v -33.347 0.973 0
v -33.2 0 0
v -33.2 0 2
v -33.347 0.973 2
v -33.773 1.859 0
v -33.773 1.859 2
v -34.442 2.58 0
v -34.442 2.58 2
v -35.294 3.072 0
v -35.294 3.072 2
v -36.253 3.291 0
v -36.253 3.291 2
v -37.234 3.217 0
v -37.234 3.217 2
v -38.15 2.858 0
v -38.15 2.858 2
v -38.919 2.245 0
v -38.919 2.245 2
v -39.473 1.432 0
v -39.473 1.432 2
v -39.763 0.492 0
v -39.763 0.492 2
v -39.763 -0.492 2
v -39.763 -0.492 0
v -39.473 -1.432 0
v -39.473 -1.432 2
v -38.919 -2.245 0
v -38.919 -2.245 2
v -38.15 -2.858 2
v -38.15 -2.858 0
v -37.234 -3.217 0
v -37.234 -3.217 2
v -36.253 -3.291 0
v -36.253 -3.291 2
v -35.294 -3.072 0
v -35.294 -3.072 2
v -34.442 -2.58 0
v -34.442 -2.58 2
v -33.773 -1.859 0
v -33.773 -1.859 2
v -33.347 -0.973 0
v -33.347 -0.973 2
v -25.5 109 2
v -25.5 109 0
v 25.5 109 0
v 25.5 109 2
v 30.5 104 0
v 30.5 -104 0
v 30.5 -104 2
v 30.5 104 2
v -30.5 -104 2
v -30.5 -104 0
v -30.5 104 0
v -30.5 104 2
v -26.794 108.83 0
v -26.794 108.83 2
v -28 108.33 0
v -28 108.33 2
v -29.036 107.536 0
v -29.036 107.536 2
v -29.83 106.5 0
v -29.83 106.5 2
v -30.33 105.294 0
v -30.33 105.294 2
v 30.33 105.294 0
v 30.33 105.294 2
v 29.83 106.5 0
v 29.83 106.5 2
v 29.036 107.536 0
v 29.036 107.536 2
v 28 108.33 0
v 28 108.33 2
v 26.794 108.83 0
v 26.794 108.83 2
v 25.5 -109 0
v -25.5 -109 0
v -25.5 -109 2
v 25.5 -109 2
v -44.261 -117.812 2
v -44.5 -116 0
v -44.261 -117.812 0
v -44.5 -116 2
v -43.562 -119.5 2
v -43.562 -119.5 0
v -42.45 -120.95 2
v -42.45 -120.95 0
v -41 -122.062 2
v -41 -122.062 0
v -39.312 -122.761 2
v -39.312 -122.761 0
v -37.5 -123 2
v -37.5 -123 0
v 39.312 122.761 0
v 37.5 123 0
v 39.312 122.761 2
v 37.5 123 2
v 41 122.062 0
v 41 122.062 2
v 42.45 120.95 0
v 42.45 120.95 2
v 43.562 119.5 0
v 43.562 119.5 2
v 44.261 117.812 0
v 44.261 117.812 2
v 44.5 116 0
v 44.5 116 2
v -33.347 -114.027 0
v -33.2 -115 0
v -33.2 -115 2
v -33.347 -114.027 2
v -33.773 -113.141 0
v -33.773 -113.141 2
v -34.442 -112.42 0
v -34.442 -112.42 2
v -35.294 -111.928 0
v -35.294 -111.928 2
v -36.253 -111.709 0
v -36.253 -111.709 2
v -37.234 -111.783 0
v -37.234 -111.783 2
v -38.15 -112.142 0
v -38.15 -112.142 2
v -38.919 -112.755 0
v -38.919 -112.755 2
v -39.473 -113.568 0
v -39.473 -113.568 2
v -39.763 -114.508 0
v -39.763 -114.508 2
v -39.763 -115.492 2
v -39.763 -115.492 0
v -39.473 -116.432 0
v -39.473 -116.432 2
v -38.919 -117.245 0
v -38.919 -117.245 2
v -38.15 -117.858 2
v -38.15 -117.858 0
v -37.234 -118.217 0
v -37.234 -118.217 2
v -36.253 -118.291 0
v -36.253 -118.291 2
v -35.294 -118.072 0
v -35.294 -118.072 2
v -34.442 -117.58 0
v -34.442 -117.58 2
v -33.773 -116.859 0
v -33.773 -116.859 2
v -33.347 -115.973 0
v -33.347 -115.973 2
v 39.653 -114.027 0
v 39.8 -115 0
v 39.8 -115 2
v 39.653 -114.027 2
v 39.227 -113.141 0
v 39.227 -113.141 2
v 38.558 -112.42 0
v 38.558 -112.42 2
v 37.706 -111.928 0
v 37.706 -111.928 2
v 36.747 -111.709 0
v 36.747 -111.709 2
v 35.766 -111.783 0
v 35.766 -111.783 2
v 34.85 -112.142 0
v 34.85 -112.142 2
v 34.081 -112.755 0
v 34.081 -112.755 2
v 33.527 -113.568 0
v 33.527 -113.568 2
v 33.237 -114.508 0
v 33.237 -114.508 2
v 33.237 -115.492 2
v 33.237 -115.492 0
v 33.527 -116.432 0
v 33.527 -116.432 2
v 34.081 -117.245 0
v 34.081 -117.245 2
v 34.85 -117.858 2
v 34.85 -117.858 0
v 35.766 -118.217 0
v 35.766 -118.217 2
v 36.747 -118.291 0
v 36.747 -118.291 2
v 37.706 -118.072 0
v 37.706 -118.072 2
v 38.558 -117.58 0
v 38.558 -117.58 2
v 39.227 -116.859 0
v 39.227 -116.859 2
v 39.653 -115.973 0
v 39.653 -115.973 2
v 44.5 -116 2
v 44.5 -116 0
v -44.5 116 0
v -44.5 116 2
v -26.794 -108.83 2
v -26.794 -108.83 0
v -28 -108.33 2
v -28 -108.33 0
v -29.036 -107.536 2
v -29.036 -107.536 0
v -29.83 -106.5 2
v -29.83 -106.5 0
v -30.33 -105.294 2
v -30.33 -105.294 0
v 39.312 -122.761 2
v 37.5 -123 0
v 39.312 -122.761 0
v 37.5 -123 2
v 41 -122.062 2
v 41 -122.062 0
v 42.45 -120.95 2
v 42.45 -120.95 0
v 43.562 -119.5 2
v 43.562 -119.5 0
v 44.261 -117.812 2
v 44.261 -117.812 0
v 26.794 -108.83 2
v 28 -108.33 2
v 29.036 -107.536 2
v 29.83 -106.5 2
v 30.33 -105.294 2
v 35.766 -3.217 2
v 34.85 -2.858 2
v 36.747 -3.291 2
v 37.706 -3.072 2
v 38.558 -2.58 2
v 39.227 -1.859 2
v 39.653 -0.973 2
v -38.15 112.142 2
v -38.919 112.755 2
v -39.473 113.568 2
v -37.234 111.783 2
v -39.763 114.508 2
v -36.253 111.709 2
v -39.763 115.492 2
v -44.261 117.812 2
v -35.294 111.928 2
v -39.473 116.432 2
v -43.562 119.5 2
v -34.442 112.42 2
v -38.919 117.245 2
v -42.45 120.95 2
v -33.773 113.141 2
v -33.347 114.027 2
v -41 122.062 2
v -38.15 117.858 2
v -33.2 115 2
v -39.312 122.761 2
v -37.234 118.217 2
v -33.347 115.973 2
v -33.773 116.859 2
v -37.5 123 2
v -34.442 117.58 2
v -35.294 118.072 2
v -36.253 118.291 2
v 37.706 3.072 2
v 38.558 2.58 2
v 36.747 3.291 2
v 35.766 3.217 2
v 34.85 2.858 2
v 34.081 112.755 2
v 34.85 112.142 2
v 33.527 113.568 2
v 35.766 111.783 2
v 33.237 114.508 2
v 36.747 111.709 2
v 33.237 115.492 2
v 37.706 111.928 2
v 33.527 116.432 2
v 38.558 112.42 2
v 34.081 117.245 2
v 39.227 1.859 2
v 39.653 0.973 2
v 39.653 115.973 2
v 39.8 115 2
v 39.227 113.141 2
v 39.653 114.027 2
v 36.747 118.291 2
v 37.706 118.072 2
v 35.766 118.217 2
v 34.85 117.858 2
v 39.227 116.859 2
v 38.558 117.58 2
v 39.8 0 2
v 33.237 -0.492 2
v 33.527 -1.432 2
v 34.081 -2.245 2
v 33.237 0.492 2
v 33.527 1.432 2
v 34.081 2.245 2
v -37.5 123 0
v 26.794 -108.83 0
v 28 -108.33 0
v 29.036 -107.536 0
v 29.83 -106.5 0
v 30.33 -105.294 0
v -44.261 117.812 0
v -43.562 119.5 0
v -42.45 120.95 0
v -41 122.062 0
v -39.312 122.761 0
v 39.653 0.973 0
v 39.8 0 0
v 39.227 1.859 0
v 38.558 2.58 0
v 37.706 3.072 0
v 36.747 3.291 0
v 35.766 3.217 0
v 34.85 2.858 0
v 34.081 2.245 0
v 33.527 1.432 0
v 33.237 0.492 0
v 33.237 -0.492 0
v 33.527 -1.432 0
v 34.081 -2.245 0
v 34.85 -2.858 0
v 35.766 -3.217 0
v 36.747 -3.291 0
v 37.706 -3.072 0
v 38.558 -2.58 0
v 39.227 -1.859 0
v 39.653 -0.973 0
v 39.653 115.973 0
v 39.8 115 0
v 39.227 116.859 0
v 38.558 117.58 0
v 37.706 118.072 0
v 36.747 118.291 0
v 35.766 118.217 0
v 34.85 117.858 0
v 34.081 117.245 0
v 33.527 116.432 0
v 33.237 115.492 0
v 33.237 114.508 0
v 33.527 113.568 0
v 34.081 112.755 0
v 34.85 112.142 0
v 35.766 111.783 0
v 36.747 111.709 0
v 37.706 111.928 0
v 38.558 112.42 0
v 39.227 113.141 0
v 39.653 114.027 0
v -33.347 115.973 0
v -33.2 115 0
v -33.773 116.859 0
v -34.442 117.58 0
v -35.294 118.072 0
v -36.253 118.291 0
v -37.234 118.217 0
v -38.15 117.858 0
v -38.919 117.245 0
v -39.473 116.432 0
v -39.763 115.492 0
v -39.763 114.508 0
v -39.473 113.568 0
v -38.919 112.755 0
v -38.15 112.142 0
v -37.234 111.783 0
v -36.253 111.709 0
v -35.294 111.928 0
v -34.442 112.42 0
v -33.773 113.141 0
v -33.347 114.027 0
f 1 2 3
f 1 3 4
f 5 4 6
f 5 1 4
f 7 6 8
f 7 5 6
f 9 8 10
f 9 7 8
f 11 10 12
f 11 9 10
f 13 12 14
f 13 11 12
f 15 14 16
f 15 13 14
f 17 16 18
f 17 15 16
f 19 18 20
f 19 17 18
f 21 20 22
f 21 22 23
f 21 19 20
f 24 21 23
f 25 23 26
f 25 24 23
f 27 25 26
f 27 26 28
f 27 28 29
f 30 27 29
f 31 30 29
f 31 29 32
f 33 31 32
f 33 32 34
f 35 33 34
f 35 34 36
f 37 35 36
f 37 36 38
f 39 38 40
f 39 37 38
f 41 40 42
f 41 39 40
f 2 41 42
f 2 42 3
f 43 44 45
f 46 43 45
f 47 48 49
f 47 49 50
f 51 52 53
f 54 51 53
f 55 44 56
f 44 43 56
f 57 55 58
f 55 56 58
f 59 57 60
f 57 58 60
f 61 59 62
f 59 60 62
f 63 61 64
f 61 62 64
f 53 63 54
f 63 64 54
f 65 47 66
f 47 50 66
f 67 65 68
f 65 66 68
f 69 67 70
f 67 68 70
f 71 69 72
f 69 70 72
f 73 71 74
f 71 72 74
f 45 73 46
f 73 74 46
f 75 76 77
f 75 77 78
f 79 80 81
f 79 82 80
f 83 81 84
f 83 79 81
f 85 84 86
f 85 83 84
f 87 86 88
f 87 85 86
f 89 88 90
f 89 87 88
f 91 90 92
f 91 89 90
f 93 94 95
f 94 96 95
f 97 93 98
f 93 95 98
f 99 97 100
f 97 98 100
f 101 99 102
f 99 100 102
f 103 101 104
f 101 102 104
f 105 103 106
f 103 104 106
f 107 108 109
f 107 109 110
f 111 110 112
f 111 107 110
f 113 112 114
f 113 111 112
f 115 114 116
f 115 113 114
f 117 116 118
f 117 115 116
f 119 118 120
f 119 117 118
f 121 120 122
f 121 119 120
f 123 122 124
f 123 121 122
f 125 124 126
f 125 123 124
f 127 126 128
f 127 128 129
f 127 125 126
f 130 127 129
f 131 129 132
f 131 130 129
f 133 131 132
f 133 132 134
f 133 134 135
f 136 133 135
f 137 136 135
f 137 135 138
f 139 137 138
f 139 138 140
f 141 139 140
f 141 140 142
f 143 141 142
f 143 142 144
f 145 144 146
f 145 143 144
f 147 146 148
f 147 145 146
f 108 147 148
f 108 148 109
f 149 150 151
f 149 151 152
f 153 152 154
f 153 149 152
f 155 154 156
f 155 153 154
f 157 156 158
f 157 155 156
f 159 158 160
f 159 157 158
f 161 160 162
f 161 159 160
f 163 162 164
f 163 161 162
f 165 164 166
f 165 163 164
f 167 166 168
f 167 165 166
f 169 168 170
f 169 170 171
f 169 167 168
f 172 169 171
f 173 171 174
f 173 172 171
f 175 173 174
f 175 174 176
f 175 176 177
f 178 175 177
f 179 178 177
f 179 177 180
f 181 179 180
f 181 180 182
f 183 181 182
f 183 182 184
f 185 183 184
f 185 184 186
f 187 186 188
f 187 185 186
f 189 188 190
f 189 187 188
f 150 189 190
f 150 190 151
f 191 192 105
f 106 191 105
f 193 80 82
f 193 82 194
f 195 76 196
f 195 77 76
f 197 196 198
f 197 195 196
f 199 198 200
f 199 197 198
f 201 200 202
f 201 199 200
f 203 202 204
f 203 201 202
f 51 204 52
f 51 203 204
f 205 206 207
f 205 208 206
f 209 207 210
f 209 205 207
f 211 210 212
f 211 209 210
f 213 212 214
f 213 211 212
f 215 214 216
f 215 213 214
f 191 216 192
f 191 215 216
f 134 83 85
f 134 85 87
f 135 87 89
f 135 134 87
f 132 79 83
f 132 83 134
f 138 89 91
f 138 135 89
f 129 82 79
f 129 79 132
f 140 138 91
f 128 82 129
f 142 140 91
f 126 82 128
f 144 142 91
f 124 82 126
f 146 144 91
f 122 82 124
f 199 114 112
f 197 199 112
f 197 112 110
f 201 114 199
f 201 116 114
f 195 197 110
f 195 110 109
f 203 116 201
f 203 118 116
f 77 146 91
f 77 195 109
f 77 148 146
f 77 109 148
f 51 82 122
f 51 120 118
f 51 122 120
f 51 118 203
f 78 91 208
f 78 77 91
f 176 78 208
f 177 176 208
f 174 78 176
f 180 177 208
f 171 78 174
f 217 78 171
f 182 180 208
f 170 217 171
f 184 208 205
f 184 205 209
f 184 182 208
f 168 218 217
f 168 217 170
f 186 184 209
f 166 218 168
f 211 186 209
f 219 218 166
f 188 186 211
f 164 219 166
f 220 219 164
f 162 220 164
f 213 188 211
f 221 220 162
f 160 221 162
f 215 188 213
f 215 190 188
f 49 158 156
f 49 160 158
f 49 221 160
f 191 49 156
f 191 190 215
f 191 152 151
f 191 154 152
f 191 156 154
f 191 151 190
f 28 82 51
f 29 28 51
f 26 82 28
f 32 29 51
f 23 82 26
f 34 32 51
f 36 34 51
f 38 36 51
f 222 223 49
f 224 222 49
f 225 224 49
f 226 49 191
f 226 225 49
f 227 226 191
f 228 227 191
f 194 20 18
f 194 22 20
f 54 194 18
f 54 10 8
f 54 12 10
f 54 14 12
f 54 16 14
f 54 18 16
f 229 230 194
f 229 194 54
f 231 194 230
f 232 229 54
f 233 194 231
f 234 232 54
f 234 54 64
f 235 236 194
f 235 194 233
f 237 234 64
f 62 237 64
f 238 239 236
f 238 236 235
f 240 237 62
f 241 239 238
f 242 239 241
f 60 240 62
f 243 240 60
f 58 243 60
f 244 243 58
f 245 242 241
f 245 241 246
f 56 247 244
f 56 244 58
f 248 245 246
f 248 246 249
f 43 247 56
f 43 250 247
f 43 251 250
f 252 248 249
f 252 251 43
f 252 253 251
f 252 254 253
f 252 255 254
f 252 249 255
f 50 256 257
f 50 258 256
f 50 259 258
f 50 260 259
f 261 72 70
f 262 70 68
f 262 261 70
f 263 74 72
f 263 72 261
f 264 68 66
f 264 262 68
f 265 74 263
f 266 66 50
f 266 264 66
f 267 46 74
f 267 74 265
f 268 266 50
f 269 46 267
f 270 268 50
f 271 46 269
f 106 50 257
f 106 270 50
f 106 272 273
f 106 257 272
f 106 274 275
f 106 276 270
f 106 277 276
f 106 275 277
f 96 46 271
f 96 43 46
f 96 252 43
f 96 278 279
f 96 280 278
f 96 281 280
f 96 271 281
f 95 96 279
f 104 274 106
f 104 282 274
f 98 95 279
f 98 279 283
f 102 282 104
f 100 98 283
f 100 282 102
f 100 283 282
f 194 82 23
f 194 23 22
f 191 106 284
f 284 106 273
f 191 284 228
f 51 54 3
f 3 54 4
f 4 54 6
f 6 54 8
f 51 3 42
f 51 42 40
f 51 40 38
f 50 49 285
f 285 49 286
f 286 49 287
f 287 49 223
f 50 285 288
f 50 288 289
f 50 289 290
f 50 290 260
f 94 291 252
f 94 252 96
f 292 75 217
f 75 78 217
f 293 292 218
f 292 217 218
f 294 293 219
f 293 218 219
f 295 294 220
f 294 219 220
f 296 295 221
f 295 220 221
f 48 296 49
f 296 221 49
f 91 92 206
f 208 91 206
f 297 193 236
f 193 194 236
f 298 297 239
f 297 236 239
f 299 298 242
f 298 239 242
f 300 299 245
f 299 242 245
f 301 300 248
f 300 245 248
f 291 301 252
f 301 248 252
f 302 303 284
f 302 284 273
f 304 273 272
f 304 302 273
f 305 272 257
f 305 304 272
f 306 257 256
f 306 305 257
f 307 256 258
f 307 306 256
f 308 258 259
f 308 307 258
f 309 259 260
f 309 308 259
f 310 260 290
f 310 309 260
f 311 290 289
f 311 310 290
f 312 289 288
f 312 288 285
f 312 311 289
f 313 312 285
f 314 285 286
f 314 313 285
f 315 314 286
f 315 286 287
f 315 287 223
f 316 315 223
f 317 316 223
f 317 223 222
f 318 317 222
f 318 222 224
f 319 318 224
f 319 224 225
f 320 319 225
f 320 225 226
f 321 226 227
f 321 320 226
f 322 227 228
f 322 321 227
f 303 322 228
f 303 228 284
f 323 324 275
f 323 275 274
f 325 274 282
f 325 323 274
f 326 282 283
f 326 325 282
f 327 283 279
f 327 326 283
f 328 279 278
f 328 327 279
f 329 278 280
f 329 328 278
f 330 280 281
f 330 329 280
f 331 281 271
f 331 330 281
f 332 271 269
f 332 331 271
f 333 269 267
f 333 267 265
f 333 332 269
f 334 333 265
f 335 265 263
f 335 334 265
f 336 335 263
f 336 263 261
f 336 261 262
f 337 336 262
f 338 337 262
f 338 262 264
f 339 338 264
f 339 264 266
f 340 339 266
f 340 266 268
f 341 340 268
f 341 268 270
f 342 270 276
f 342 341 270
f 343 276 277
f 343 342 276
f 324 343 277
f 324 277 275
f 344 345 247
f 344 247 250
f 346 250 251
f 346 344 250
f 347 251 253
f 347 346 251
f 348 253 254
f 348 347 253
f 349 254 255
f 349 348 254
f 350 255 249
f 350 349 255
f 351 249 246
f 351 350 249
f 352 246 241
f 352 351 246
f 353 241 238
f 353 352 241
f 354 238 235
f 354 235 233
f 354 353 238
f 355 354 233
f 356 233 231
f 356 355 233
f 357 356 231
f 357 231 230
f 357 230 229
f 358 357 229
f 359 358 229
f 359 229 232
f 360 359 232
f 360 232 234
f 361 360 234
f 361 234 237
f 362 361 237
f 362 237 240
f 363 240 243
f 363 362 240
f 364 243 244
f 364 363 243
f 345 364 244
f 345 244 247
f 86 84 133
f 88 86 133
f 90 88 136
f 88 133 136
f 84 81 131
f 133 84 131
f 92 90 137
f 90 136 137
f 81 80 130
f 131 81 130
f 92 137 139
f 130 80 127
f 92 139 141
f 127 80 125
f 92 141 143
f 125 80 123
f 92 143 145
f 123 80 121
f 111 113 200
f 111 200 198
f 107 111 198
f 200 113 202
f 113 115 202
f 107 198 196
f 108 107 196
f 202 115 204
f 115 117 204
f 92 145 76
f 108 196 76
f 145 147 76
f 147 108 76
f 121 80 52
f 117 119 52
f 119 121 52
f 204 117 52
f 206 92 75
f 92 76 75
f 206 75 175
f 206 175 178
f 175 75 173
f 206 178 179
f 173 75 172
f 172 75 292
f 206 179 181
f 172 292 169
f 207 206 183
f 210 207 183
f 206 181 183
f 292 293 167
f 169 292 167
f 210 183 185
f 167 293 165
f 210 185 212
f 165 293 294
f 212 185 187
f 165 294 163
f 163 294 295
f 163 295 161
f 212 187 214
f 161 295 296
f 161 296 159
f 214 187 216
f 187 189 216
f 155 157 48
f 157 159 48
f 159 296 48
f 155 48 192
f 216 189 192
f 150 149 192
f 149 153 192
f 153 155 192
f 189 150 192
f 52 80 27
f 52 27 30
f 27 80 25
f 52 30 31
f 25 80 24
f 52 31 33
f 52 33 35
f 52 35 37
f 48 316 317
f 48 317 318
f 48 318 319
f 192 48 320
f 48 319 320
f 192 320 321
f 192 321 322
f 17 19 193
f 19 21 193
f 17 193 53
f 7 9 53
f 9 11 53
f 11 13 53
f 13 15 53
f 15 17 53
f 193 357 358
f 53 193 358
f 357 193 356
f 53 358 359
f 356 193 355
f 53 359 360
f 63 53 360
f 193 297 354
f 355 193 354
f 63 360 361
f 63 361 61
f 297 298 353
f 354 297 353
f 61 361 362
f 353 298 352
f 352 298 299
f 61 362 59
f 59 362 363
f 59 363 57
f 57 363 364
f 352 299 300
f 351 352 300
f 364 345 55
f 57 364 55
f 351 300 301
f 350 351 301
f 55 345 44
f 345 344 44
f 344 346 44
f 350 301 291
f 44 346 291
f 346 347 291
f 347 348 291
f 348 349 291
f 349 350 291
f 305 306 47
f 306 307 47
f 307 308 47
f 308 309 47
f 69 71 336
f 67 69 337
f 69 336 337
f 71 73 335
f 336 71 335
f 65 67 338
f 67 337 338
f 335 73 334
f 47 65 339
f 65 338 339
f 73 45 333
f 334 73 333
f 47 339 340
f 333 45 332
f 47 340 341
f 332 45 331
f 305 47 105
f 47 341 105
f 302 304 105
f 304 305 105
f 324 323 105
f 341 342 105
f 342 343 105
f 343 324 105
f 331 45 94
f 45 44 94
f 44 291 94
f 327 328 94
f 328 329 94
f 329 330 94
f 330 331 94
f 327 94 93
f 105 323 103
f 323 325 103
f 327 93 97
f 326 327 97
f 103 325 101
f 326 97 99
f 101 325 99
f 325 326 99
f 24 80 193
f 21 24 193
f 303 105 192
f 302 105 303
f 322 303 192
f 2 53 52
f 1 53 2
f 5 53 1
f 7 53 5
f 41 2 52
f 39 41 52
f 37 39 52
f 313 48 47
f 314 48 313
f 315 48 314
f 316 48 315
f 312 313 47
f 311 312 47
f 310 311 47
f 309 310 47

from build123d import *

# Parameters (mm, degrees)
SKETCH_1_W              = 89
SKETCH_1_H              = 246
SKETCH_1_W_2            = 61
SKETCH_1_H_2            = 218
EXTRUDE_1_DEPTH         = 2
FILLET_1_R              = 5
FILLET_2_R              = 7
HOLE_WIZARD_1_OUTLINE_R = 3.3
HOLE_WIZARD_1_DEPTH     = 2


# Read off the part's stored shape, not the designer's step: 孔1
with BuildPart() as part:
    # 草图1 → 凸台-拉伸1 (new body)
    with BuildSketch(Plane.XY):
        Rectangle(SKETCH_1_W, SKETCH_1_H)
        Rectangle(SKETCH_1_W_2, SKETCH_1_H_2, mode=Mode.SUBTRACT)
    extrude(amount=EXTRUDE_1_DEPTH)

    # 圆角1
    fillet_1_edges = [part.edges().sort_by_distance(p)[0] for p in [
        (30.5, -109, 1),
        (30.5, 109, 1),
        (-30.5, 109, 1),
        (-30.5, -109, 1),
    ]]
    fillet(fillet_1_edges, radius=FILLET_1_R)

    # 圆角2
    fillet_2_edges = [part.edges().sort_by_distance(p)[0] for p in [
        (44.5, -123, 1),
        (-44.5, -123, 1),
        (-44.5, 123, 1),
        (44.5, 123, 1),
    ]]
    fillet(fillet_2_edges, radius=FILLET_2_R)

    # 孔1 outline → 孔1 (cut)
    with BuildSketch(Plane.XY):
        with Locations((36.5, 0)):
            Circle(HOLE_WIZARD_1_OUTLINE_R)
        with Locations((-36.5, 0)):
            Circle(HOLE_WIZARD_1_OUTLINE_R)
        with Locations((36.5, -115)):
            Circle(HOLE_WIZARD_1_OUTLINE_R)
        with Locations((-36.5, 115)):
            Circle(HOLE_WIZARD_1_OUTLINE_R)
        with Locations((-36.5, -115)):
            Circle(HOLE_WIZARD_1_OUTLINE_R)
        with Locations((36.5, 115)):
            Circle(HOLE_WIZARD_1_OUTLINE_R)
    extrude(amount=HOLE_WIZARD_1_DEPTH, mode=Mode.SUBTRACT)


solid = part.part
